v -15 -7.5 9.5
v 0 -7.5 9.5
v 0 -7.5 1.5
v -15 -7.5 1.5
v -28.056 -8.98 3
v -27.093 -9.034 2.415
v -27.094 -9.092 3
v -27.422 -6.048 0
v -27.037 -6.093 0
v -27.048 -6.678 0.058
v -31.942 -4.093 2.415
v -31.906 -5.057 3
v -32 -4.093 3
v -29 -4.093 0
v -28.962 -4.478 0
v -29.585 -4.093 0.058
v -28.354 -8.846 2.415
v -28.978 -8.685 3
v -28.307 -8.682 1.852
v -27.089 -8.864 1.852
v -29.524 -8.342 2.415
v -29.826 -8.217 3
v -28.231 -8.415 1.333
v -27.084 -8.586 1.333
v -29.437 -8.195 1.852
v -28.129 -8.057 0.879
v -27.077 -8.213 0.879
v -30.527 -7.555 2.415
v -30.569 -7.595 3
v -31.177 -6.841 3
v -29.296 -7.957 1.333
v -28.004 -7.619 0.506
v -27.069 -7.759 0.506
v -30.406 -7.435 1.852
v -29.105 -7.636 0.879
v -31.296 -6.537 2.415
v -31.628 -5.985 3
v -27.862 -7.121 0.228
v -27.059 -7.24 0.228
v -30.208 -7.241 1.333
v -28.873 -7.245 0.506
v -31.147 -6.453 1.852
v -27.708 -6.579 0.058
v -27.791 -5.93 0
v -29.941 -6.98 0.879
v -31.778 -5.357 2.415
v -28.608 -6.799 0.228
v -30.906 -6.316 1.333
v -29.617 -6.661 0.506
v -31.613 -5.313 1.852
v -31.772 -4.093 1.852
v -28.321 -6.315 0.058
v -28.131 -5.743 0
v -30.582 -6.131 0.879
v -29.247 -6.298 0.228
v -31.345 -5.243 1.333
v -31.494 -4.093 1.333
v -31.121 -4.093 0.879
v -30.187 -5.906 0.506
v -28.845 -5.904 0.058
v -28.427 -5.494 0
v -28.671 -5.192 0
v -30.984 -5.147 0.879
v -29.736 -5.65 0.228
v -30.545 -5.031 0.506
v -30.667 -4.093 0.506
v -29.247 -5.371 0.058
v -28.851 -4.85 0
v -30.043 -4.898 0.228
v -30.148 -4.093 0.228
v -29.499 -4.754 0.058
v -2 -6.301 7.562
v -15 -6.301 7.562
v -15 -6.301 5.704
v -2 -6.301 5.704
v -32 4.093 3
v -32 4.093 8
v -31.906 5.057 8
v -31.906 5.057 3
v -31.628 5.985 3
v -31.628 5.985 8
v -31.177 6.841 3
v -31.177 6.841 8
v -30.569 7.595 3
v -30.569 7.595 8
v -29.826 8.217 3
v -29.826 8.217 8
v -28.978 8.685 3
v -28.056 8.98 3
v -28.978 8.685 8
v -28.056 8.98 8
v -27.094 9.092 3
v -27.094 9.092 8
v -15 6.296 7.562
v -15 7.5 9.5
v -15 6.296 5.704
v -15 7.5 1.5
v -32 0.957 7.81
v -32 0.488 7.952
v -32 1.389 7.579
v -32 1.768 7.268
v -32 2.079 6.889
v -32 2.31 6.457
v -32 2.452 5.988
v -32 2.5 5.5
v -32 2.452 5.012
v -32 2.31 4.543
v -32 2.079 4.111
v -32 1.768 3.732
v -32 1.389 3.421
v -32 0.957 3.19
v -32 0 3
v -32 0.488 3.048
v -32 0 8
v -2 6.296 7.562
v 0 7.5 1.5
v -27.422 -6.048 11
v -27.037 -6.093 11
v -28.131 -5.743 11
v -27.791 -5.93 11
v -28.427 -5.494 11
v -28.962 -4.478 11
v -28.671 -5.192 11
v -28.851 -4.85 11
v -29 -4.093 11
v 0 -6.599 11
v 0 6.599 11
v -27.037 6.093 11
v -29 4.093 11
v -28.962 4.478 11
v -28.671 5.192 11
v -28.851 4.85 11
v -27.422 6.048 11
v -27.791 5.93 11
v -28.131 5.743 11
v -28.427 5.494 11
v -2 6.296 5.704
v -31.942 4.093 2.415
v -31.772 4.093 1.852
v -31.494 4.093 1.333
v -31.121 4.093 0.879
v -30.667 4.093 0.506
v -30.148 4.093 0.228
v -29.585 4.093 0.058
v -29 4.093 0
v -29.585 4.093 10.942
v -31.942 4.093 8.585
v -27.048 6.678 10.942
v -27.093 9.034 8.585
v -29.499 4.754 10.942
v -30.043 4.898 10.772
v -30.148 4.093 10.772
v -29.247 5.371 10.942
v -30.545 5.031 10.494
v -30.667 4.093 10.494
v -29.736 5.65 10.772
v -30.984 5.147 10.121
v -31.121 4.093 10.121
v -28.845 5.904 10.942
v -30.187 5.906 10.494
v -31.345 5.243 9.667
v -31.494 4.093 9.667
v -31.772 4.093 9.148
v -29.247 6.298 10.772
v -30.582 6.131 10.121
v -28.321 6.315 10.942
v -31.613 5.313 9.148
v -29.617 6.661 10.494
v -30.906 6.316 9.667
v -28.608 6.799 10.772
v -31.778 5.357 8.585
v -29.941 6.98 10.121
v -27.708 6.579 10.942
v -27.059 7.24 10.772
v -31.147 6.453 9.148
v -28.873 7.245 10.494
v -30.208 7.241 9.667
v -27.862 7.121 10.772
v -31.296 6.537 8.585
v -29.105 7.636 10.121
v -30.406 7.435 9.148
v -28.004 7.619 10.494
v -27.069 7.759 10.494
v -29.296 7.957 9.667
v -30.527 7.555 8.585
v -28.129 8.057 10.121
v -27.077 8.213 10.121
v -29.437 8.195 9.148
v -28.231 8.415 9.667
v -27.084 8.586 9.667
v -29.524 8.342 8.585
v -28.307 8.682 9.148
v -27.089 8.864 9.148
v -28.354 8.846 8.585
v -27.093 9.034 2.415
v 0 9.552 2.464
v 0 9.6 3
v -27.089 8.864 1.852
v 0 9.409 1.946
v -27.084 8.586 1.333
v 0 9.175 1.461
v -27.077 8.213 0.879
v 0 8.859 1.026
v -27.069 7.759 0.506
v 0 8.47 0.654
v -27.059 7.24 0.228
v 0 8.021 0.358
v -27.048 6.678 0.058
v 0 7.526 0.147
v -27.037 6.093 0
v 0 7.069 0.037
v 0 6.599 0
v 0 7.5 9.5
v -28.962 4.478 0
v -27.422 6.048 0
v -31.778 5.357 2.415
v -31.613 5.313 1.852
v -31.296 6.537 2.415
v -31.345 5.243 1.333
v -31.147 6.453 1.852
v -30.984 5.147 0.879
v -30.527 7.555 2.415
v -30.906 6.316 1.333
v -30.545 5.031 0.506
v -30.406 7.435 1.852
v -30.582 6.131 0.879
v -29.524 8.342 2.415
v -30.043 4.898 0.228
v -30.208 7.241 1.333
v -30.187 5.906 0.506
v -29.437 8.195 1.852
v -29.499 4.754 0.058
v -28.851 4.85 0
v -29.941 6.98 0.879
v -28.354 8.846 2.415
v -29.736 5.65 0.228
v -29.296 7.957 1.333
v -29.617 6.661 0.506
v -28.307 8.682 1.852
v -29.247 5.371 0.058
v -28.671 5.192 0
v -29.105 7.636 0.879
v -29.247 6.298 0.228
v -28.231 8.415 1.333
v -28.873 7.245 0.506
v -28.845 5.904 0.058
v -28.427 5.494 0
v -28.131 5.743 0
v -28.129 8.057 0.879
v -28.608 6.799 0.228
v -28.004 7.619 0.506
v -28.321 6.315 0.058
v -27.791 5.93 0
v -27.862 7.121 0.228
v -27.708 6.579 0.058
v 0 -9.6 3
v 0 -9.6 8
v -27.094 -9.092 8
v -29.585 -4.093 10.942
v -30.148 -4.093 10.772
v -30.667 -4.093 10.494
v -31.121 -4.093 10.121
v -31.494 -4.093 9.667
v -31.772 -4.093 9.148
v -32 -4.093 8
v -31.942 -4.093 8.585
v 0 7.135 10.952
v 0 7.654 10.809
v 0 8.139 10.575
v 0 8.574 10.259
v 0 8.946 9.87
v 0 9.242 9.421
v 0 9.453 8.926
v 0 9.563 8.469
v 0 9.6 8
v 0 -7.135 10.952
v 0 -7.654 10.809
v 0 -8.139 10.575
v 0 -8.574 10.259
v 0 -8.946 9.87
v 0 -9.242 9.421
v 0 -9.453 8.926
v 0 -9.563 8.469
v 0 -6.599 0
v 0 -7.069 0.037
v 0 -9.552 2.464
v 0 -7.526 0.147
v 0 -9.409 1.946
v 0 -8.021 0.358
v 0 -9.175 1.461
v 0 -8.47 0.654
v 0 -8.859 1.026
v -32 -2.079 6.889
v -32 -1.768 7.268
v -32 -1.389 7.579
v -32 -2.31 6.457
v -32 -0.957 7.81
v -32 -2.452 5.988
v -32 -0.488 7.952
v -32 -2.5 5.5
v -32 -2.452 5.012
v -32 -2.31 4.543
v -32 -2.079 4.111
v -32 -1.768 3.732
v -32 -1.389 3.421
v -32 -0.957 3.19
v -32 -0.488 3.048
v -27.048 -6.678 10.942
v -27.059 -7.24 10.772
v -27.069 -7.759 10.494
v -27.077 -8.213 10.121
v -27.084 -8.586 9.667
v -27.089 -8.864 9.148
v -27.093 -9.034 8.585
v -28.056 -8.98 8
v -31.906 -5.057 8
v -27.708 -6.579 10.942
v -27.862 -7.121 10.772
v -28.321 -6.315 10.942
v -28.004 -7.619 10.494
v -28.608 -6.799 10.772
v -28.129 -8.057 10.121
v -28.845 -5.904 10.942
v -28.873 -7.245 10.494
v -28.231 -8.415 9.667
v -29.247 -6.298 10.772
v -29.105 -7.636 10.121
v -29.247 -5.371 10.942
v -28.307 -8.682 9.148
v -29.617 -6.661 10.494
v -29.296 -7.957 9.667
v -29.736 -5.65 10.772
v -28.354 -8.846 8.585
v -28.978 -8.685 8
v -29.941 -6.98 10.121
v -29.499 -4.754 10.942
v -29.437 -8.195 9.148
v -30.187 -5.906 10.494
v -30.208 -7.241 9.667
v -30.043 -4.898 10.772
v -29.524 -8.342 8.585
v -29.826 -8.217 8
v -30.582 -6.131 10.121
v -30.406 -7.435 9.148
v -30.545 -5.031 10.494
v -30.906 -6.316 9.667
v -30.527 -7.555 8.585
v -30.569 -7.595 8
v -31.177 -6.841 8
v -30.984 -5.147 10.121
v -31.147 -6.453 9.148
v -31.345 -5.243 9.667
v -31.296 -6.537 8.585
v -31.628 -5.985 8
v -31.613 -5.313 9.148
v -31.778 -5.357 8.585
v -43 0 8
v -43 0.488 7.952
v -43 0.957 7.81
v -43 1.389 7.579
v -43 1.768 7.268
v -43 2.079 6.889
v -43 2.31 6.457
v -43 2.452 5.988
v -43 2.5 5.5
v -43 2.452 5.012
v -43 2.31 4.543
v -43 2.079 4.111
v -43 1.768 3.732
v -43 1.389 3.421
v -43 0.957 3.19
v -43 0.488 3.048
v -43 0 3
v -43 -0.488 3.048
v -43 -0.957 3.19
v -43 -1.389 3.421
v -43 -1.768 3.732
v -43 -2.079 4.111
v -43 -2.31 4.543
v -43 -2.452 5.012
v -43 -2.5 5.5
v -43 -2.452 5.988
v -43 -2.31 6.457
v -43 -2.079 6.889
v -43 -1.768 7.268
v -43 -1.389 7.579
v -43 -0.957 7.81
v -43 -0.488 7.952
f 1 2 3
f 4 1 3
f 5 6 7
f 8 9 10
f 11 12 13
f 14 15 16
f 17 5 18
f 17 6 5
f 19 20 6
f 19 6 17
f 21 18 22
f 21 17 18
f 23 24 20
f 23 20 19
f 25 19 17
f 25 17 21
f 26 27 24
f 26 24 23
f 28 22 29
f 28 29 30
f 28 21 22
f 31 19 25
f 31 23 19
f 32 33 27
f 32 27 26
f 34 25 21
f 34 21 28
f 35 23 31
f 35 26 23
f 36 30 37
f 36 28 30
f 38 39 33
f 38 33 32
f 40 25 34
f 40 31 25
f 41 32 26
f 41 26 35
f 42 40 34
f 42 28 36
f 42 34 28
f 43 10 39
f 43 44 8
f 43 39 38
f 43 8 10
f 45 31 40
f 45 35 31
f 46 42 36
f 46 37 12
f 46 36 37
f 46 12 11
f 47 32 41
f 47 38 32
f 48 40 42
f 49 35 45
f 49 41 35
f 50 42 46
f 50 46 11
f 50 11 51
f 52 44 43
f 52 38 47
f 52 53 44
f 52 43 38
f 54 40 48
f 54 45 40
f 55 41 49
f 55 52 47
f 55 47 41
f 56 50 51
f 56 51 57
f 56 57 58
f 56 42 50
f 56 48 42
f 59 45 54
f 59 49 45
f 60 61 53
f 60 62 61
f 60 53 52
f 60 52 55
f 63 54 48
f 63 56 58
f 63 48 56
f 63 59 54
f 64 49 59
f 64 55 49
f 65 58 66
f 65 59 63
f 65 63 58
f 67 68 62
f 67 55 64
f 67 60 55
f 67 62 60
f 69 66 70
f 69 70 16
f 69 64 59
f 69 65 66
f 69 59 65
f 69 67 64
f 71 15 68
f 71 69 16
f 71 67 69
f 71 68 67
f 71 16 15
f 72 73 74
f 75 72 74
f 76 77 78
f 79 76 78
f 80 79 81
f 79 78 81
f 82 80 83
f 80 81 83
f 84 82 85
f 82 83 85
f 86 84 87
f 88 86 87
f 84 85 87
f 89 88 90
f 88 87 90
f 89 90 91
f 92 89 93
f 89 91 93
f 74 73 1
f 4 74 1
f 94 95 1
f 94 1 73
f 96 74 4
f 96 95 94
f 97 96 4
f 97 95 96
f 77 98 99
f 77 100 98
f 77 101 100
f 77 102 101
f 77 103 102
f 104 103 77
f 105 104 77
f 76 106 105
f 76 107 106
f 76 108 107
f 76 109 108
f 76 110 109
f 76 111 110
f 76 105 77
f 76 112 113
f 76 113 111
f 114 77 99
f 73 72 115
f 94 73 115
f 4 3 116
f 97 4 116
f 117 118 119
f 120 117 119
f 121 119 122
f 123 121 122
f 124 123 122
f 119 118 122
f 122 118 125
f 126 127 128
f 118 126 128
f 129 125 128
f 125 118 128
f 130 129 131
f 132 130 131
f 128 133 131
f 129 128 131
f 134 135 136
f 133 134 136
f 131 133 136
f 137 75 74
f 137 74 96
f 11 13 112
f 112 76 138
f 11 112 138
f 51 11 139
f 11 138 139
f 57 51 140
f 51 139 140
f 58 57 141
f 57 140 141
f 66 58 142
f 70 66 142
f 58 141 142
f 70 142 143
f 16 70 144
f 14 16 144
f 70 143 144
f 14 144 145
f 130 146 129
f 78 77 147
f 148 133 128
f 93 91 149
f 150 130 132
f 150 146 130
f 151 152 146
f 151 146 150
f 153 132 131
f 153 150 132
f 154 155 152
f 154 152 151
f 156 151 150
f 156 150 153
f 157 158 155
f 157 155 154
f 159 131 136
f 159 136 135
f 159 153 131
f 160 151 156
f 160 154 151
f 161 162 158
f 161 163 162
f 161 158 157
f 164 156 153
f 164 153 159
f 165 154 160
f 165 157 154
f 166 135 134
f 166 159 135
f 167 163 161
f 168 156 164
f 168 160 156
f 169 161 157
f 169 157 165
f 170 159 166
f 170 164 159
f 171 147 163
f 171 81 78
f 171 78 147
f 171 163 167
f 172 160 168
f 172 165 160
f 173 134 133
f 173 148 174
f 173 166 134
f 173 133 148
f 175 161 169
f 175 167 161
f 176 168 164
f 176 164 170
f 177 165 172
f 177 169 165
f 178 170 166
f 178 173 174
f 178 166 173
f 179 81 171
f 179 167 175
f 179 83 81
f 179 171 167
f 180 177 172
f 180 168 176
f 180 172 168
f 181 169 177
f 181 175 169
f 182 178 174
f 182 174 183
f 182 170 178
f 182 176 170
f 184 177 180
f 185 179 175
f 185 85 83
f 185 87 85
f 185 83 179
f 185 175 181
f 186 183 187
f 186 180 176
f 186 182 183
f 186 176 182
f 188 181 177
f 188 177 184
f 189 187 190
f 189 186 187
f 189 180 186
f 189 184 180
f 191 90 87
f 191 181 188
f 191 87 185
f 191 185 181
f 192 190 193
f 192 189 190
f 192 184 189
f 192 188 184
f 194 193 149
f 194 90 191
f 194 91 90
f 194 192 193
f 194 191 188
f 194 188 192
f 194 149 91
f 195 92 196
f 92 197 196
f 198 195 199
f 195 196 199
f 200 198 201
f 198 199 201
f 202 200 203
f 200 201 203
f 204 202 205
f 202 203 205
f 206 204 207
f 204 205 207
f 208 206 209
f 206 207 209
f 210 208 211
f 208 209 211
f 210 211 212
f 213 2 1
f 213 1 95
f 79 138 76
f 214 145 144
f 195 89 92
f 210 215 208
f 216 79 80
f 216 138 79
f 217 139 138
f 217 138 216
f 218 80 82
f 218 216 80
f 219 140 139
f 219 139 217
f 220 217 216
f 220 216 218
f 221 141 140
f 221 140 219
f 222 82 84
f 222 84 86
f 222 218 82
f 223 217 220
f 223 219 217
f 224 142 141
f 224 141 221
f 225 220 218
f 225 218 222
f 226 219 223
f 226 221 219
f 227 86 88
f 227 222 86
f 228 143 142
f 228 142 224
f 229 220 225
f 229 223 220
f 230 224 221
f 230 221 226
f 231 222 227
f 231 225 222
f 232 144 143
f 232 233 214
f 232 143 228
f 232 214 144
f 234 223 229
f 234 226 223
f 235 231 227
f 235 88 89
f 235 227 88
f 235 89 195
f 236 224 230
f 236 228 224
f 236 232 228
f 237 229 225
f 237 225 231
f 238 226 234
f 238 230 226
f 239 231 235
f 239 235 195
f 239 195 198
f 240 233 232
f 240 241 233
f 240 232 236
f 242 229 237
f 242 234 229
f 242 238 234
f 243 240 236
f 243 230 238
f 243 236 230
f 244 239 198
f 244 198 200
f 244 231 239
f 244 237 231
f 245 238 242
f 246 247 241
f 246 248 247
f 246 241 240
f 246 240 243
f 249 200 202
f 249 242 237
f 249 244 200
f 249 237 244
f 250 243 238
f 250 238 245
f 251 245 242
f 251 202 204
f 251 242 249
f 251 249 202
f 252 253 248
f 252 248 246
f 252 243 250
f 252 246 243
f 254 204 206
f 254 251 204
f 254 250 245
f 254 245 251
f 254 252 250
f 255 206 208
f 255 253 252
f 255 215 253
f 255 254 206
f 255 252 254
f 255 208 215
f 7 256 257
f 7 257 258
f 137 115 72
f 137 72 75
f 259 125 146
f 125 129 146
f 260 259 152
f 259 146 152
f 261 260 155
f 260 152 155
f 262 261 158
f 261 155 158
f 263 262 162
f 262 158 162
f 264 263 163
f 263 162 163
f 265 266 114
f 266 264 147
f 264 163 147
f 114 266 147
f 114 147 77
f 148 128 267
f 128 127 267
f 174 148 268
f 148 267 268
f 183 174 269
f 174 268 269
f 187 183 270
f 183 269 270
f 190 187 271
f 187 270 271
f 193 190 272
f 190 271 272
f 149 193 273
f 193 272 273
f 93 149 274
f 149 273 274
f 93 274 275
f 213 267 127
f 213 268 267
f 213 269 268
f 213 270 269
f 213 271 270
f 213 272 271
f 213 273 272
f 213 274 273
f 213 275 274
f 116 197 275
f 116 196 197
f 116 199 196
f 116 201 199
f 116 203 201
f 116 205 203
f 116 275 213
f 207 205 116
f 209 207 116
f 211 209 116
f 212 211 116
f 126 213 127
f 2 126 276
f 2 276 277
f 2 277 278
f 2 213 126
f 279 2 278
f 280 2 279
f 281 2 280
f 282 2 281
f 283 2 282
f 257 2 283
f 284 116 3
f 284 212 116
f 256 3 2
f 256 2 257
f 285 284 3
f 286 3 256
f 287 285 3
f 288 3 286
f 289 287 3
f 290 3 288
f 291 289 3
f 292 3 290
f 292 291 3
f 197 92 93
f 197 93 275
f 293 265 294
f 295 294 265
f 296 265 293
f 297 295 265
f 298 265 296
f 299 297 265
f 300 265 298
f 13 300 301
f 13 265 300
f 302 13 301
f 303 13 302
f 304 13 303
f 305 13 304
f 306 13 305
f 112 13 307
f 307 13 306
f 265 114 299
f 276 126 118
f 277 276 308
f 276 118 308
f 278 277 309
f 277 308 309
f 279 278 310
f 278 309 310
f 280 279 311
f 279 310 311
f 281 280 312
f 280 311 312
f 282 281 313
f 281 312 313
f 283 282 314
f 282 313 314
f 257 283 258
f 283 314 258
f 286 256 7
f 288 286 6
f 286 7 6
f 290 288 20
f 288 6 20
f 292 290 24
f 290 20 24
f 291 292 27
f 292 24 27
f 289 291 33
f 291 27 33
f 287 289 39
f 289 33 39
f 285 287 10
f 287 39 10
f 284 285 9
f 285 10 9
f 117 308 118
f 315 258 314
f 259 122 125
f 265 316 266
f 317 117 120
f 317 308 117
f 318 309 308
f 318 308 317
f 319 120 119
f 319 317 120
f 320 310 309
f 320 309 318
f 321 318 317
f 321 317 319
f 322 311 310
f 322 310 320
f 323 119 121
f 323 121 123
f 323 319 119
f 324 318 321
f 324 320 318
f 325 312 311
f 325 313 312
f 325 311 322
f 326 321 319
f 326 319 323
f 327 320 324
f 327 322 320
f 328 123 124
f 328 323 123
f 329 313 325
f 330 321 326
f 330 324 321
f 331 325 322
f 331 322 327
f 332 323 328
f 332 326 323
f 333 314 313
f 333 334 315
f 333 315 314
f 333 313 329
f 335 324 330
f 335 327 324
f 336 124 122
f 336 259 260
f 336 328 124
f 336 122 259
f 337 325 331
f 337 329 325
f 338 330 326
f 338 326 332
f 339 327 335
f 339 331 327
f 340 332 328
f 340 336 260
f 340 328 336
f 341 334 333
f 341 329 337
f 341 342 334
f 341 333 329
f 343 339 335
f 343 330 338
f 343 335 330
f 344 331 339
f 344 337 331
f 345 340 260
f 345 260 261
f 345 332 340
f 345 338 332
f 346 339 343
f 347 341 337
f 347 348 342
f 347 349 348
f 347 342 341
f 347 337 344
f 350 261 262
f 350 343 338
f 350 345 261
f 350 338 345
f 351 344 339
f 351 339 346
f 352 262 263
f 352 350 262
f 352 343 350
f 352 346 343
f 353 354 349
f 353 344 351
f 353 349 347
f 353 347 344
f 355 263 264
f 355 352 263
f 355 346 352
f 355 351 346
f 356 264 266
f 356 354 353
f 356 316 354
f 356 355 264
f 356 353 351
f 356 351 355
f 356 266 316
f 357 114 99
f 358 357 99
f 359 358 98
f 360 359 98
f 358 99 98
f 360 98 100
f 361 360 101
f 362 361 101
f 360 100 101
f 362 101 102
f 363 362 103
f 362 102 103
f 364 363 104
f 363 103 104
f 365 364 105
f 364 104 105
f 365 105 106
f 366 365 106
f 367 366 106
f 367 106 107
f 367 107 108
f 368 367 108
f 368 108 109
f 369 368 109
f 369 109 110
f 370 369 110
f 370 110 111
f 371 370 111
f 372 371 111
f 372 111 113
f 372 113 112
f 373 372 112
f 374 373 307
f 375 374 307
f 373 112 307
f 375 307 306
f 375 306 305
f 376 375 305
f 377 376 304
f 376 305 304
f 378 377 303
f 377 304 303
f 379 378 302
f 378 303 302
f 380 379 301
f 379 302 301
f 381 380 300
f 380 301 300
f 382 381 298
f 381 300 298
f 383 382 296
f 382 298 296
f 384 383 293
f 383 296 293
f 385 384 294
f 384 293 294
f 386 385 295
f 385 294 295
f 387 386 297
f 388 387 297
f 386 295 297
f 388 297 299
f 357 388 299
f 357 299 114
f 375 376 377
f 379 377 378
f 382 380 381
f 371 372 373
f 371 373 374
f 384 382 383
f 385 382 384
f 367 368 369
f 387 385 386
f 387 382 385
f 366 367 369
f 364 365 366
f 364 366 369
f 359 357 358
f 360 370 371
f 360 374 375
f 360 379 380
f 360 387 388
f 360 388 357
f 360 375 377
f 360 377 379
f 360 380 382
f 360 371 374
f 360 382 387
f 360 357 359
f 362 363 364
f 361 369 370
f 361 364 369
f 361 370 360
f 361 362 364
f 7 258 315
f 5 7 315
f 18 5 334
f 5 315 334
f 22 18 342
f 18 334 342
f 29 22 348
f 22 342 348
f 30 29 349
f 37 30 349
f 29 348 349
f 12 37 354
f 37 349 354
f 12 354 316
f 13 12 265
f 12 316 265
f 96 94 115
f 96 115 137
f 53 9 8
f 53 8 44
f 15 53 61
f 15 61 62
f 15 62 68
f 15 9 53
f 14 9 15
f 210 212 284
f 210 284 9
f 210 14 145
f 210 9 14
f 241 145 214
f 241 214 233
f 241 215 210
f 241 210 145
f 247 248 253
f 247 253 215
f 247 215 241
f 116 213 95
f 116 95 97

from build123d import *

# Parameters (mm, degrees)
SALIENTE_EXTRUIR1_DEPTH = 11
REDONDEO1_R             = 5
REDONDEO2_R             = 3
CROQUIS2_R              = 2.5
SALIENTE_EXTRUIR2_DEPTH = 11
CROQUIS3_W              = 8
CROQUIS3_H              = 15
CORTAR_EXTRUIR1_DEPTH   = 15
CROQUIS4_W              = 1.857543752
CROQUIS4_H              = 12.596468565
SALIENTE_EXTRUIR3_DEPTH = 13


with BuildPart() as part:
    # Croquis1 → Saliente-Extruir1 (new body)
    with BuildSketch(Plane.XY):
        Polygon((0, 9.6), (0, -9.6), (-32, -9), (-32, 9), align=None)
    extrude(amount=SALIENTE_EXTRUIR1_DEPTH)

    # Redondeo1
    redondeo1_edges = [part.edges().sort_by_distance(p)[0] for p in [
        (-32, -9, 5.5),
        (-32, 9, 5.5),
    ]]
    fillet(redondeo1_edges, radius=REDONDEO1_R)

    # Redondeo2
    redondeo2_edges = [part.edges().sort_by_distance(p)[0] for p in [
        (-13.546866762, 9.345996248, 11),
        (-13.546866762, -9.345996248, 0),
        (-13.546866762, -9.345996248, 11),
        (-32, 0, 0),
        (-30.568519835, 7.595108483, 0),
        (-30.568519835, -7.595108483, 0),
        (-32, 0, 11),
        (-30.568519835, 7.595108483, 11),
        (-30.568519835, -7.595108483, 11),
        (-13.546866762, 9.345996248, 0),
    ]]
    fillet(redondeo2_edges, radius=REDONDEO2_R)

    # Croquis2 → Saliente-Extruir2 (add)
    with BuildSketch(Plane.ZY.offset(32)):
        with Locations((5.5, 0)):
            Circle(CROQUIS2_R)
    extrude(amount=SALIENTE_EXTRUIR2_DEPTH)

    # Croquis3 → Cortar-Extruir1 (cut)
    with BuildSketch(Plane(origin=(0, 0, 0), x_dir=(0, 0, -1), z_dir=(1, 0, 0))):
        with Locations((-5.5, 0)):
            Rectangle(CROQUIS3_W, CROQUIS3_H)
    extrude(amount=-CORTAR_EXTRUIR1_DEPTH, mode=Mode.SUBTRACT)

    # Croquis4 → Saliente-Extruir3 (add)
    with BuildSketch(Plane(origin=(-15, 0, 0), x_dir=(0, 0, -1), z_dir=(1, 0, 0))):
        with Locations((-6.633221346, -0.002349923)):
            Rectangle(CROQUIS4_W, CROQUIS4_H)
    extrude(amount=SALIENTE_EXTRUIR3_DEPTH)


solid = part.part
